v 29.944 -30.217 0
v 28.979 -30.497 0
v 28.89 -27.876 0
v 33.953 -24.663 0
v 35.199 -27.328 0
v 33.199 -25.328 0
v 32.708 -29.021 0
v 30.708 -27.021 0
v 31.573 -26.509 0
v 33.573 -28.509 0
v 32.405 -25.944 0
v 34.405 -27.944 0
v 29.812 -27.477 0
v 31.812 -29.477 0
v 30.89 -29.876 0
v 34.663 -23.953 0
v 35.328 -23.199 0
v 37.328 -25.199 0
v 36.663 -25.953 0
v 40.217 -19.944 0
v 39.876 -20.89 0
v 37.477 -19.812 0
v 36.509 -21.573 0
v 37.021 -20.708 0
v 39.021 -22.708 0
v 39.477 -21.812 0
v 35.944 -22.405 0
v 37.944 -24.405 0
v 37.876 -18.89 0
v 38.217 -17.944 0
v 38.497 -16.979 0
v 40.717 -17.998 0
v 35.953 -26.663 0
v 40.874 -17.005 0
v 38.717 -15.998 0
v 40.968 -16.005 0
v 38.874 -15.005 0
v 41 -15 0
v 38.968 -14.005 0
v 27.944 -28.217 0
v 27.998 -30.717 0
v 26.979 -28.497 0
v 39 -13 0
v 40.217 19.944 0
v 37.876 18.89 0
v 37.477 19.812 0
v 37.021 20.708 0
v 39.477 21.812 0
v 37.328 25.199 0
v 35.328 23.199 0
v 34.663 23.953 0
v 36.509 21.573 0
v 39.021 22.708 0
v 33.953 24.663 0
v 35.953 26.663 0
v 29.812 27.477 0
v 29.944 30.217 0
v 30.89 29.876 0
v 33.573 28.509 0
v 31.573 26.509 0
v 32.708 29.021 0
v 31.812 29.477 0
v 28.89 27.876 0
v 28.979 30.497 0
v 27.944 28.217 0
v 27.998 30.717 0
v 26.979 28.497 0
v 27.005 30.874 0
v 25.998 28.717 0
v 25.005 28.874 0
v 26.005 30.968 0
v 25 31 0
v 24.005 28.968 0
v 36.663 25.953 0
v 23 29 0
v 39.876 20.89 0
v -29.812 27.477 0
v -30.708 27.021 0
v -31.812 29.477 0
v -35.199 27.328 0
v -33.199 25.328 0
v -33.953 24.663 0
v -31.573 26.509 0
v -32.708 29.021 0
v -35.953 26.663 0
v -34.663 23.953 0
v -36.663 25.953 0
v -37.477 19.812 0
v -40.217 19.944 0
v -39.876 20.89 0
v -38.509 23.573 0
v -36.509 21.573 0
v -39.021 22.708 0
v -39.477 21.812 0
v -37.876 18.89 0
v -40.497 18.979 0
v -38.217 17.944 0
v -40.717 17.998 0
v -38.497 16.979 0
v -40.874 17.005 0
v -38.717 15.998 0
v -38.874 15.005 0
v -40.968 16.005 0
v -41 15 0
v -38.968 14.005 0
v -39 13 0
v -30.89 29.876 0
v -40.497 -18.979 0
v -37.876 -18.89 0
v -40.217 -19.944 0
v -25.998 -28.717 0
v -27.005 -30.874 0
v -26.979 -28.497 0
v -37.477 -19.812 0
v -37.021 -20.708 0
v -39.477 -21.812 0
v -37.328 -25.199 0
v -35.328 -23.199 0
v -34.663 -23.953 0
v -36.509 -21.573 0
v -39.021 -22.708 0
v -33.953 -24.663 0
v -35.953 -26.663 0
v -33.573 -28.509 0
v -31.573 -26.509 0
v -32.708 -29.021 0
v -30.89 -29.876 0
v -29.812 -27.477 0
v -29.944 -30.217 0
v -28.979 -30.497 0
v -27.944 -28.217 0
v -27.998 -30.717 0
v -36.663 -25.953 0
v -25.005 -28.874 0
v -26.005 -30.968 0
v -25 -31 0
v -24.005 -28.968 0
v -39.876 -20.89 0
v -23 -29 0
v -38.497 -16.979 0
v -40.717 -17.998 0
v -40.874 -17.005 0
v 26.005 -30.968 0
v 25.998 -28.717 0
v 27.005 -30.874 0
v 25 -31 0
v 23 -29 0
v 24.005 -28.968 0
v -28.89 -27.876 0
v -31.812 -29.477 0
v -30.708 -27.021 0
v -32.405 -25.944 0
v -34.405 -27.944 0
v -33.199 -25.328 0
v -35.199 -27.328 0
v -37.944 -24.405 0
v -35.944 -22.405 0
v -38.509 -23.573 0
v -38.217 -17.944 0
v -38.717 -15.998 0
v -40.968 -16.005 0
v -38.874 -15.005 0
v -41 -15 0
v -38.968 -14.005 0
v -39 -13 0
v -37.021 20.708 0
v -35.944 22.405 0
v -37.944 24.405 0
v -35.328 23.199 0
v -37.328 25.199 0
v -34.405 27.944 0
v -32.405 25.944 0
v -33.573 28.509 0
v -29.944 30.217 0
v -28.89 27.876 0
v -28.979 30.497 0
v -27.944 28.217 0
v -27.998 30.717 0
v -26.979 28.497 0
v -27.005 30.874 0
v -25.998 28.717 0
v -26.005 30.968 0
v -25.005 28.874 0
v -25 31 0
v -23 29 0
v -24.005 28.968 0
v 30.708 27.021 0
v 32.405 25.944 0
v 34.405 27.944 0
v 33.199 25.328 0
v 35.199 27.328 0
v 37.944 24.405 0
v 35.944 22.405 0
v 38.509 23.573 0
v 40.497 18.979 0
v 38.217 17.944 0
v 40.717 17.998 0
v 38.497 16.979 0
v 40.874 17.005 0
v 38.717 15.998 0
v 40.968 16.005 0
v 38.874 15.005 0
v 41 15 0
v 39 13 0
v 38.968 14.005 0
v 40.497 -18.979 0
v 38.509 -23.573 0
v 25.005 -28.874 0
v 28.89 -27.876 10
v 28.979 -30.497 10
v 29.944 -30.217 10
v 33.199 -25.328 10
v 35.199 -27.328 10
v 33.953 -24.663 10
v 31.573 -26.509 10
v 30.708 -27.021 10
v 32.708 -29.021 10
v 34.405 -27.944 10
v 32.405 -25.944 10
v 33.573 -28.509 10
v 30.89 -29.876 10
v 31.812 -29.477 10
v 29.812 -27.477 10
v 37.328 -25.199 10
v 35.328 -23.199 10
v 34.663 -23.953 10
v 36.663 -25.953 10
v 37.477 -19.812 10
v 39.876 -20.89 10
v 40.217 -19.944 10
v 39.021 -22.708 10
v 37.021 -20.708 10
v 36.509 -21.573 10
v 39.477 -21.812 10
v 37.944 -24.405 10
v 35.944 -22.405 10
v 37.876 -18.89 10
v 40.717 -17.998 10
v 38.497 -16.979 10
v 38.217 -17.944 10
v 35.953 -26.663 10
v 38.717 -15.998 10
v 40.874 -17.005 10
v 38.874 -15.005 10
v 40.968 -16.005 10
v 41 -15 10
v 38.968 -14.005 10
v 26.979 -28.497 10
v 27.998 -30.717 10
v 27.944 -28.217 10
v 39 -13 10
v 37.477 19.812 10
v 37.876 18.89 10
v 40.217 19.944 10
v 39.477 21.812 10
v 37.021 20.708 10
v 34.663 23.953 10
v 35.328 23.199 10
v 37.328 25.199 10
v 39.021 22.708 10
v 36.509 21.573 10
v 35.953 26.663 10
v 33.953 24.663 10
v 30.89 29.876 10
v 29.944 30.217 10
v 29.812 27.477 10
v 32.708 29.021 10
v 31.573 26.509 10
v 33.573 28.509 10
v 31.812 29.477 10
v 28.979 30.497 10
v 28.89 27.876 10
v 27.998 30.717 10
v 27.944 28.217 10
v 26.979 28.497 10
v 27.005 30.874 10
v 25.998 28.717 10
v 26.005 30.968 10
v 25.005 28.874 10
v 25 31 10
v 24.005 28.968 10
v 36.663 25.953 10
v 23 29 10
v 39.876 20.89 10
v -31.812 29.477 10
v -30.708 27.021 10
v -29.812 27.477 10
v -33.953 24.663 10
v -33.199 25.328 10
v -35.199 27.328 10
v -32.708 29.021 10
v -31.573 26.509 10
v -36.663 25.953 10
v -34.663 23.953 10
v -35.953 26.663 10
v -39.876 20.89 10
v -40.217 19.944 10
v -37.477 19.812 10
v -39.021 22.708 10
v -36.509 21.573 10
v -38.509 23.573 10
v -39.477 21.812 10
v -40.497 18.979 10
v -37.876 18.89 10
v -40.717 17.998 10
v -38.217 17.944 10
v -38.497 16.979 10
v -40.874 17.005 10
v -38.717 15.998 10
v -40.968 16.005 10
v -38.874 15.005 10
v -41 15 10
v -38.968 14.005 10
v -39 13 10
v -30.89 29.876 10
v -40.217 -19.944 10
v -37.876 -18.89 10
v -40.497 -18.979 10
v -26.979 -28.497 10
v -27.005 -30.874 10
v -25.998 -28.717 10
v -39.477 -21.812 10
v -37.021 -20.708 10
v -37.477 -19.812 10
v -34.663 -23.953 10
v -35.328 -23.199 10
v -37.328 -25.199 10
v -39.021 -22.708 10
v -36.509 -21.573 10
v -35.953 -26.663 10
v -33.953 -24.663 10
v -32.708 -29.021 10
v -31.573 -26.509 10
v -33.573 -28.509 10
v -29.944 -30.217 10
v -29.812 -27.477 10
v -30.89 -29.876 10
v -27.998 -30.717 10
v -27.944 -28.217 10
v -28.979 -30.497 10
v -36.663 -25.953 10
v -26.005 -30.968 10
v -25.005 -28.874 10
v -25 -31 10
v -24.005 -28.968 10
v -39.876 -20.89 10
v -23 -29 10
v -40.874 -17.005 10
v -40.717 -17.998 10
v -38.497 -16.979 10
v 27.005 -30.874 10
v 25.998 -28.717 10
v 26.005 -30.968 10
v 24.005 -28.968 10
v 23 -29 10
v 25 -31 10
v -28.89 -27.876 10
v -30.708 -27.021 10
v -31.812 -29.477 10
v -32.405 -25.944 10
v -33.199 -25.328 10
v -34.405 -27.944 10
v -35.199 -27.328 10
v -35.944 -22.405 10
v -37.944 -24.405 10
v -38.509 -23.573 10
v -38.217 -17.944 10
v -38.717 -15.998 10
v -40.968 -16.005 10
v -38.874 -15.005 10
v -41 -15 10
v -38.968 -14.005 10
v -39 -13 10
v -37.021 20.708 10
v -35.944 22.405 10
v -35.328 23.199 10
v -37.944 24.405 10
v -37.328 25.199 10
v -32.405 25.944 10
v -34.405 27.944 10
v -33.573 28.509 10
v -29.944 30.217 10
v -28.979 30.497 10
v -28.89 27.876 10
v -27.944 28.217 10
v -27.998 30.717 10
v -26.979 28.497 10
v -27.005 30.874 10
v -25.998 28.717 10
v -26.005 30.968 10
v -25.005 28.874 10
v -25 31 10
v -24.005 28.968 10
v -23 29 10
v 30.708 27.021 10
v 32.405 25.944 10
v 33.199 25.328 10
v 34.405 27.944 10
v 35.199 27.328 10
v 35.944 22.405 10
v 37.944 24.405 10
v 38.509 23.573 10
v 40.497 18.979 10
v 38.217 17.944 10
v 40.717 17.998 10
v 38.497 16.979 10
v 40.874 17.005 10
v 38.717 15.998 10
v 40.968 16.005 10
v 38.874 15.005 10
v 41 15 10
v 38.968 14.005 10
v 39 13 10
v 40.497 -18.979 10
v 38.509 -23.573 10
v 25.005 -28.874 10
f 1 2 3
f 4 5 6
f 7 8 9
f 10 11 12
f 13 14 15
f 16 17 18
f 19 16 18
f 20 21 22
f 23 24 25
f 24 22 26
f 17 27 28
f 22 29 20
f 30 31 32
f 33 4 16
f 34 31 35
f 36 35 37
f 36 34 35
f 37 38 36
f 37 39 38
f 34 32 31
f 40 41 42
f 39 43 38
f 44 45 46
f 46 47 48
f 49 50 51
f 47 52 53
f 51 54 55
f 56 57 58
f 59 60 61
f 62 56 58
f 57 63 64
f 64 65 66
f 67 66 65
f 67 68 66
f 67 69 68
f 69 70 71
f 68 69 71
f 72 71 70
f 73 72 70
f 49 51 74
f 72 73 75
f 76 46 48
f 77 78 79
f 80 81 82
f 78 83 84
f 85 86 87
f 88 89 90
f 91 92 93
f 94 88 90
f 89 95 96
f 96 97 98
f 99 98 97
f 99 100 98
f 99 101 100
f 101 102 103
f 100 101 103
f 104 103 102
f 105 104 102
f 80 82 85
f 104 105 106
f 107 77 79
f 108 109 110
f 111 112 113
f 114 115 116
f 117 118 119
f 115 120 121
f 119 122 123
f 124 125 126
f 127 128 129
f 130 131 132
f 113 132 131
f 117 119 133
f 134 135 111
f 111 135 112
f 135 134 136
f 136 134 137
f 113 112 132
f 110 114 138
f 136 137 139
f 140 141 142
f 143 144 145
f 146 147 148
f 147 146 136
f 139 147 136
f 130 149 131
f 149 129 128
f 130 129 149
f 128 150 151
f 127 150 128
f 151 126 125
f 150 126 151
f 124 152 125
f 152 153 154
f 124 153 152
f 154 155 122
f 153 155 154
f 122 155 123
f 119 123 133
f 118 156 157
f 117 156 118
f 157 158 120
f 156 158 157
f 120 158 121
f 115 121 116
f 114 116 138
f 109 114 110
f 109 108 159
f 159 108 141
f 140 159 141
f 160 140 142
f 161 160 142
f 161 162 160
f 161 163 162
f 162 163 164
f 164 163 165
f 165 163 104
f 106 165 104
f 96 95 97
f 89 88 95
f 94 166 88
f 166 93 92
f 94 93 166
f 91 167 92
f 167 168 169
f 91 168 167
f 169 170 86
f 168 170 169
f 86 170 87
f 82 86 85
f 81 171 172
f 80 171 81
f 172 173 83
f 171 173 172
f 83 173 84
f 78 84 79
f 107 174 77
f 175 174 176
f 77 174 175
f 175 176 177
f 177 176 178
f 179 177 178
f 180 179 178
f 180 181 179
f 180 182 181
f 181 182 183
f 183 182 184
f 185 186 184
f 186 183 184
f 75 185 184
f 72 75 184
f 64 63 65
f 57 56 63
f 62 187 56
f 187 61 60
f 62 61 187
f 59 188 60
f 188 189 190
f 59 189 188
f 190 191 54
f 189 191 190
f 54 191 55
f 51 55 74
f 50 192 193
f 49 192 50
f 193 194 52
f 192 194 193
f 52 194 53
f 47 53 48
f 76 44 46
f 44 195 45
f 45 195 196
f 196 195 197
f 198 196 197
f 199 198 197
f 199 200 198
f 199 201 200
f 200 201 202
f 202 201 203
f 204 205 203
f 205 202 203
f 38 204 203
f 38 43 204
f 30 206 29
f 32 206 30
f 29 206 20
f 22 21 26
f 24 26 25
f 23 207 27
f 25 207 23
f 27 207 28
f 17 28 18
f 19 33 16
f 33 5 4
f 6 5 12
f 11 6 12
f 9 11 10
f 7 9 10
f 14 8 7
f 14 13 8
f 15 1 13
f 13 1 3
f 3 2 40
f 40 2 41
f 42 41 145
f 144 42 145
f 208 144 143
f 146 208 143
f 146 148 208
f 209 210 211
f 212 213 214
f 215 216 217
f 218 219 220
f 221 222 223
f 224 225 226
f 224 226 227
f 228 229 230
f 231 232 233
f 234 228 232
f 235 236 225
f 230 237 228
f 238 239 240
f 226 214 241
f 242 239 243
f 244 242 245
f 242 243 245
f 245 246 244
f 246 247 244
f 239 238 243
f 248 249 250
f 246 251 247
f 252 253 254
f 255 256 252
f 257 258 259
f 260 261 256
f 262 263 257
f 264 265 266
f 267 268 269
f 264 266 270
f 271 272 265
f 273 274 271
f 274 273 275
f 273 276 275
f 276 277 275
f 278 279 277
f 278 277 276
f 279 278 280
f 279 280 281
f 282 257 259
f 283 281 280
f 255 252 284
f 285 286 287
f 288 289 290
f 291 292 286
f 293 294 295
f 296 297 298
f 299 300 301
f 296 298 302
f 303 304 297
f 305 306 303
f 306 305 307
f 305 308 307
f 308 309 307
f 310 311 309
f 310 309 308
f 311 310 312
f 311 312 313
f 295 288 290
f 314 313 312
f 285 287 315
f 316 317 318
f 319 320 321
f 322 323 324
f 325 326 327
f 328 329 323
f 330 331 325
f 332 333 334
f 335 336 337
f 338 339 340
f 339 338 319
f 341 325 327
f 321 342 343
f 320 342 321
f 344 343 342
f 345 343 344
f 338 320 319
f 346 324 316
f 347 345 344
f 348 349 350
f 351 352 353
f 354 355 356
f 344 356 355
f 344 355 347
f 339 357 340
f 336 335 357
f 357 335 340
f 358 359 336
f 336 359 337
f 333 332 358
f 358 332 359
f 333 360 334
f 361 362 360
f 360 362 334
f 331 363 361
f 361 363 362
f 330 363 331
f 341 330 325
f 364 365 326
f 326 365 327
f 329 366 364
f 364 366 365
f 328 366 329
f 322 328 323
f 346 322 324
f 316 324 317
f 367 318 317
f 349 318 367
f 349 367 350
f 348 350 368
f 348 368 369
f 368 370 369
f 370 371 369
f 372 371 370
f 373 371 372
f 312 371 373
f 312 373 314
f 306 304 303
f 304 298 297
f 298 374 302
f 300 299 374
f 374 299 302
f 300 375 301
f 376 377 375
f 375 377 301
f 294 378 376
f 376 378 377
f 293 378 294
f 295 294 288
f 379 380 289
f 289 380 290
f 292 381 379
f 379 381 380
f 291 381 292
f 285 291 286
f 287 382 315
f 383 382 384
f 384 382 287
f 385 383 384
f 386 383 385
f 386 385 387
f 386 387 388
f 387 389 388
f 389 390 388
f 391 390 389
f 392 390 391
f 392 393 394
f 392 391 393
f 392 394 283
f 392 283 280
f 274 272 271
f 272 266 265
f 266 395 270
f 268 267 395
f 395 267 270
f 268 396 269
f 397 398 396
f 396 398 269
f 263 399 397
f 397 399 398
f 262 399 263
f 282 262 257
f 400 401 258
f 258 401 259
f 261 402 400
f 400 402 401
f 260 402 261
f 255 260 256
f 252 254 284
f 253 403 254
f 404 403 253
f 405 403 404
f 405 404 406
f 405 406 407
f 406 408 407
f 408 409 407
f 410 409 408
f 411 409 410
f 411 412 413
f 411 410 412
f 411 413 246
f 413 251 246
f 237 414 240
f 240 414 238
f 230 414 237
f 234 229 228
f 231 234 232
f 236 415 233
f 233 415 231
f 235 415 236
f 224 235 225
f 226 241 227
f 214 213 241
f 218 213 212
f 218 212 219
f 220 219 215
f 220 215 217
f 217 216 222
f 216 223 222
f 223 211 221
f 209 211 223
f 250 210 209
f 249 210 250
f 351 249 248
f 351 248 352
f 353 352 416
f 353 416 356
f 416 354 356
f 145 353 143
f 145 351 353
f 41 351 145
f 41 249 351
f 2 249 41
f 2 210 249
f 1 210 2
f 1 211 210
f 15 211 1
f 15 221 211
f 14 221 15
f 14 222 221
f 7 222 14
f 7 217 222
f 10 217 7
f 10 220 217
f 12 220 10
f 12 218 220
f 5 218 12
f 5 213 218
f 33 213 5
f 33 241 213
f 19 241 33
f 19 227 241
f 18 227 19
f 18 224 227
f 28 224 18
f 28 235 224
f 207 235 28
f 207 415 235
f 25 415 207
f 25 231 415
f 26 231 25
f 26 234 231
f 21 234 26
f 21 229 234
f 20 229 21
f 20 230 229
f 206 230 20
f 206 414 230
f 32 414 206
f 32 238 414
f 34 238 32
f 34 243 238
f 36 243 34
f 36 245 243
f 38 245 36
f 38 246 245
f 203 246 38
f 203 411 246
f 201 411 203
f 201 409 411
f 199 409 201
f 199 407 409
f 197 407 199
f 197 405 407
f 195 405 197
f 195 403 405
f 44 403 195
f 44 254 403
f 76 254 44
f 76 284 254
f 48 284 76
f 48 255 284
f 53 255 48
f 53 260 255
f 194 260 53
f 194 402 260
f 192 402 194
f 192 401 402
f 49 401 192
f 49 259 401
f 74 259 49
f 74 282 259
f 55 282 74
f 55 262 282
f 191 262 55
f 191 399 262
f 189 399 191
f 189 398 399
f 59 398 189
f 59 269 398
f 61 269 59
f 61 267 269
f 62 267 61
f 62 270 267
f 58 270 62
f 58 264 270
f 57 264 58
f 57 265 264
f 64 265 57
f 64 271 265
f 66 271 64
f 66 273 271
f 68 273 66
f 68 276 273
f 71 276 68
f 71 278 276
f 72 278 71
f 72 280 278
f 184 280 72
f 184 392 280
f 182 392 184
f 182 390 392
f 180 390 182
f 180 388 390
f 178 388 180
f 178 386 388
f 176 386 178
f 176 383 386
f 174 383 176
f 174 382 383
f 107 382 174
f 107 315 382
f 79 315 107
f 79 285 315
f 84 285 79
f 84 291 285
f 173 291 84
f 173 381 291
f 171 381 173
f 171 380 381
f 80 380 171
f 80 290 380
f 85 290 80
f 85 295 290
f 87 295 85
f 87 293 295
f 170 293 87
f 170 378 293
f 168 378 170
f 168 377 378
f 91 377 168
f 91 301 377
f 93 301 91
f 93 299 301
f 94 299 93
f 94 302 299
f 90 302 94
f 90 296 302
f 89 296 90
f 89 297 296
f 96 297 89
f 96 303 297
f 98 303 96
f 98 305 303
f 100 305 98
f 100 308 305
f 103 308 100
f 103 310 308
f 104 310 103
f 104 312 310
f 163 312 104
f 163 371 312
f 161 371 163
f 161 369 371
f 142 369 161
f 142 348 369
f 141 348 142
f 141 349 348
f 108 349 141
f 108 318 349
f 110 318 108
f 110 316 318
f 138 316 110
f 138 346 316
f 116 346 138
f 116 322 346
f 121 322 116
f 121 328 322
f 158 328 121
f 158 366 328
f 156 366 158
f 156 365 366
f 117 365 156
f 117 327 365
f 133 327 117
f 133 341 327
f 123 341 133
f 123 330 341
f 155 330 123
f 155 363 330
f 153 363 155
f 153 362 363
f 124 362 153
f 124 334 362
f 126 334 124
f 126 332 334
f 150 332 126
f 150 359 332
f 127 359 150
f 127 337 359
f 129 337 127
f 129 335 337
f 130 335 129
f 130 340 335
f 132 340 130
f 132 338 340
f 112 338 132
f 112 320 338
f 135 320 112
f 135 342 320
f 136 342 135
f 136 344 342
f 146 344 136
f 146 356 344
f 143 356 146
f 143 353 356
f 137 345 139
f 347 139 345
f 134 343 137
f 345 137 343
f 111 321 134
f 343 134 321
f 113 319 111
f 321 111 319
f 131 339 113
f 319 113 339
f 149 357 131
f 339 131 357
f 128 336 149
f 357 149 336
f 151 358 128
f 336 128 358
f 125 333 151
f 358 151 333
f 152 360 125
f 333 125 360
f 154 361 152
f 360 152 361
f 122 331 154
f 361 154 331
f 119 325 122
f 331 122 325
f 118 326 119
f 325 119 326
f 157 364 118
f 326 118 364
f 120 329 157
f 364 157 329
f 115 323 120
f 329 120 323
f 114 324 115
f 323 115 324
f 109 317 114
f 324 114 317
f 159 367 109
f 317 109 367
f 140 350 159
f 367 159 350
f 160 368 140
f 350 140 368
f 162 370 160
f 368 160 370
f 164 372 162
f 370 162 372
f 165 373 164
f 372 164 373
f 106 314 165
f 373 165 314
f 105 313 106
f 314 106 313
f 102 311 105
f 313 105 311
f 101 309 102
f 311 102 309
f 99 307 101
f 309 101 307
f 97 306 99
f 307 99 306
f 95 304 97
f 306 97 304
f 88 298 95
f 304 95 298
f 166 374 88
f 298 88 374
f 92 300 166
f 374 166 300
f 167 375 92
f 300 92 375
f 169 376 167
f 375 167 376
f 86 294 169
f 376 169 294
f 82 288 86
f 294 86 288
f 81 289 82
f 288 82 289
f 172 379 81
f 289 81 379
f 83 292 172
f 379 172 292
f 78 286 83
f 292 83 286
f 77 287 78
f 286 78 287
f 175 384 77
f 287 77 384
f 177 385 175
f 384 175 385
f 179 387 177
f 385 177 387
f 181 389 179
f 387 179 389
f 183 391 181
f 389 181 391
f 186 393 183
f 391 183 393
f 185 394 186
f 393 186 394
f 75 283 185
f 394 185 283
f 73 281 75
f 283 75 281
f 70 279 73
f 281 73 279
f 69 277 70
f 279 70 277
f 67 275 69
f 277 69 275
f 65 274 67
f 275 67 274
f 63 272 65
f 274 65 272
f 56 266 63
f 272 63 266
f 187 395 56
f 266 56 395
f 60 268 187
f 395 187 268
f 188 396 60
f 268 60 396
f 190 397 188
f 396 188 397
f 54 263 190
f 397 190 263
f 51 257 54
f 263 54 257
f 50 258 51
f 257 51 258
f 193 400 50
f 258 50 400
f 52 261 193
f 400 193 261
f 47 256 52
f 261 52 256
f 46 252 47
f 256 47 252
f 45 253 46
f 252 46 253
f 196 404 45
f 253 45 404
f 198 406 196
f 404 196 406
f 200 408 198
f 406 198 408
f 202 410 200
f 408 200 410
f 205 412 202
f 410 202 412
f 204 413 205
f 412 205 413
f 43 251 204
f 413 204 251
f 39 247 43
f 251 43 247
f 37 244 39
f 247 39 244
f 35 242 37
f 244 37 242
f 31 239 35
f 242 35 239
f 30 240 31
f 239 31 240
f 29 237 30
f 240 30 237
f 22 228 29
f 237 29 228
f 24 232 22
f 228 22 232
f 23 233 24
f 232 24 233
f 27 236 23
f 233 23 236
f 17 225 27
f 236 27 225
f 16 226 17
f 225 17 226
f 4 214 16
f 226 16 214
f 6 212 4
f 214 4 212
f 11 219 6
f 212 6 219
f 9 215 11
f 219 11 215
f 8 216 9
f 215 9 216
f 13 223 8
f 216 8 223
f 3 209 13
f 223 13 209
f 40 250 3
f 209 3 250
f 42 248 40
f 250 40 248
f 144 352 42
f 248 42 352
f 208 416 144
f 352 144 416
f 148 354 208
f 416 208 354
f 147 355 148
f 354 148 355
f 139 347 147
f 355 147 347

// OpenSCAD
//$fs = 0.01;
//$fa = 0.01;
$fn = 100;
minkowski_circle = 16;
wallThickness = 4;

outerwidth1 = 78;
outerheight1 = 58;
height1 = 110;
wallThickness1 = wallThickness;

outerwidth2 = 76 - minkowski_circle;
outerheight2 = 56 - minkowski_circle;
height2 = 100;
wallThickness2 = wallThickness;


// For clips to hold rubber in place
//squareTube(outerwidth2,outerheight2,wallThickness2,10);

// To scure around downspout when attaching with glue
squareTube(62+wallThickness,42+wallThickness,wallThickness,10);

module squareTube(outerwidth, outerheight, wallThickness, height)
{
    linear_extrude(height,true)
    difference()
    {
        minkowski()
        {
        square([outerwidth-minkowski_circle, outerheight-minkowski_circle],true);
            circle(minkowski_circle);
        }
        
        minkowski()
        {
        square([outerwidth-wallThickness-minkowski_circle,outerheight-wallThickness-minkowski_circle],true);
                        circle(minkowski_circle);
        }
    }
}

module solidTube(outerwidth, outerheight, wallThickness, height)
{
    linear_extrude(height,true)
    minkowski()
    {
        square([outerwidth-minkowski_circle, outerheight-minkowski_circle],true);
        circle(minkowski_circle);
    }
}
